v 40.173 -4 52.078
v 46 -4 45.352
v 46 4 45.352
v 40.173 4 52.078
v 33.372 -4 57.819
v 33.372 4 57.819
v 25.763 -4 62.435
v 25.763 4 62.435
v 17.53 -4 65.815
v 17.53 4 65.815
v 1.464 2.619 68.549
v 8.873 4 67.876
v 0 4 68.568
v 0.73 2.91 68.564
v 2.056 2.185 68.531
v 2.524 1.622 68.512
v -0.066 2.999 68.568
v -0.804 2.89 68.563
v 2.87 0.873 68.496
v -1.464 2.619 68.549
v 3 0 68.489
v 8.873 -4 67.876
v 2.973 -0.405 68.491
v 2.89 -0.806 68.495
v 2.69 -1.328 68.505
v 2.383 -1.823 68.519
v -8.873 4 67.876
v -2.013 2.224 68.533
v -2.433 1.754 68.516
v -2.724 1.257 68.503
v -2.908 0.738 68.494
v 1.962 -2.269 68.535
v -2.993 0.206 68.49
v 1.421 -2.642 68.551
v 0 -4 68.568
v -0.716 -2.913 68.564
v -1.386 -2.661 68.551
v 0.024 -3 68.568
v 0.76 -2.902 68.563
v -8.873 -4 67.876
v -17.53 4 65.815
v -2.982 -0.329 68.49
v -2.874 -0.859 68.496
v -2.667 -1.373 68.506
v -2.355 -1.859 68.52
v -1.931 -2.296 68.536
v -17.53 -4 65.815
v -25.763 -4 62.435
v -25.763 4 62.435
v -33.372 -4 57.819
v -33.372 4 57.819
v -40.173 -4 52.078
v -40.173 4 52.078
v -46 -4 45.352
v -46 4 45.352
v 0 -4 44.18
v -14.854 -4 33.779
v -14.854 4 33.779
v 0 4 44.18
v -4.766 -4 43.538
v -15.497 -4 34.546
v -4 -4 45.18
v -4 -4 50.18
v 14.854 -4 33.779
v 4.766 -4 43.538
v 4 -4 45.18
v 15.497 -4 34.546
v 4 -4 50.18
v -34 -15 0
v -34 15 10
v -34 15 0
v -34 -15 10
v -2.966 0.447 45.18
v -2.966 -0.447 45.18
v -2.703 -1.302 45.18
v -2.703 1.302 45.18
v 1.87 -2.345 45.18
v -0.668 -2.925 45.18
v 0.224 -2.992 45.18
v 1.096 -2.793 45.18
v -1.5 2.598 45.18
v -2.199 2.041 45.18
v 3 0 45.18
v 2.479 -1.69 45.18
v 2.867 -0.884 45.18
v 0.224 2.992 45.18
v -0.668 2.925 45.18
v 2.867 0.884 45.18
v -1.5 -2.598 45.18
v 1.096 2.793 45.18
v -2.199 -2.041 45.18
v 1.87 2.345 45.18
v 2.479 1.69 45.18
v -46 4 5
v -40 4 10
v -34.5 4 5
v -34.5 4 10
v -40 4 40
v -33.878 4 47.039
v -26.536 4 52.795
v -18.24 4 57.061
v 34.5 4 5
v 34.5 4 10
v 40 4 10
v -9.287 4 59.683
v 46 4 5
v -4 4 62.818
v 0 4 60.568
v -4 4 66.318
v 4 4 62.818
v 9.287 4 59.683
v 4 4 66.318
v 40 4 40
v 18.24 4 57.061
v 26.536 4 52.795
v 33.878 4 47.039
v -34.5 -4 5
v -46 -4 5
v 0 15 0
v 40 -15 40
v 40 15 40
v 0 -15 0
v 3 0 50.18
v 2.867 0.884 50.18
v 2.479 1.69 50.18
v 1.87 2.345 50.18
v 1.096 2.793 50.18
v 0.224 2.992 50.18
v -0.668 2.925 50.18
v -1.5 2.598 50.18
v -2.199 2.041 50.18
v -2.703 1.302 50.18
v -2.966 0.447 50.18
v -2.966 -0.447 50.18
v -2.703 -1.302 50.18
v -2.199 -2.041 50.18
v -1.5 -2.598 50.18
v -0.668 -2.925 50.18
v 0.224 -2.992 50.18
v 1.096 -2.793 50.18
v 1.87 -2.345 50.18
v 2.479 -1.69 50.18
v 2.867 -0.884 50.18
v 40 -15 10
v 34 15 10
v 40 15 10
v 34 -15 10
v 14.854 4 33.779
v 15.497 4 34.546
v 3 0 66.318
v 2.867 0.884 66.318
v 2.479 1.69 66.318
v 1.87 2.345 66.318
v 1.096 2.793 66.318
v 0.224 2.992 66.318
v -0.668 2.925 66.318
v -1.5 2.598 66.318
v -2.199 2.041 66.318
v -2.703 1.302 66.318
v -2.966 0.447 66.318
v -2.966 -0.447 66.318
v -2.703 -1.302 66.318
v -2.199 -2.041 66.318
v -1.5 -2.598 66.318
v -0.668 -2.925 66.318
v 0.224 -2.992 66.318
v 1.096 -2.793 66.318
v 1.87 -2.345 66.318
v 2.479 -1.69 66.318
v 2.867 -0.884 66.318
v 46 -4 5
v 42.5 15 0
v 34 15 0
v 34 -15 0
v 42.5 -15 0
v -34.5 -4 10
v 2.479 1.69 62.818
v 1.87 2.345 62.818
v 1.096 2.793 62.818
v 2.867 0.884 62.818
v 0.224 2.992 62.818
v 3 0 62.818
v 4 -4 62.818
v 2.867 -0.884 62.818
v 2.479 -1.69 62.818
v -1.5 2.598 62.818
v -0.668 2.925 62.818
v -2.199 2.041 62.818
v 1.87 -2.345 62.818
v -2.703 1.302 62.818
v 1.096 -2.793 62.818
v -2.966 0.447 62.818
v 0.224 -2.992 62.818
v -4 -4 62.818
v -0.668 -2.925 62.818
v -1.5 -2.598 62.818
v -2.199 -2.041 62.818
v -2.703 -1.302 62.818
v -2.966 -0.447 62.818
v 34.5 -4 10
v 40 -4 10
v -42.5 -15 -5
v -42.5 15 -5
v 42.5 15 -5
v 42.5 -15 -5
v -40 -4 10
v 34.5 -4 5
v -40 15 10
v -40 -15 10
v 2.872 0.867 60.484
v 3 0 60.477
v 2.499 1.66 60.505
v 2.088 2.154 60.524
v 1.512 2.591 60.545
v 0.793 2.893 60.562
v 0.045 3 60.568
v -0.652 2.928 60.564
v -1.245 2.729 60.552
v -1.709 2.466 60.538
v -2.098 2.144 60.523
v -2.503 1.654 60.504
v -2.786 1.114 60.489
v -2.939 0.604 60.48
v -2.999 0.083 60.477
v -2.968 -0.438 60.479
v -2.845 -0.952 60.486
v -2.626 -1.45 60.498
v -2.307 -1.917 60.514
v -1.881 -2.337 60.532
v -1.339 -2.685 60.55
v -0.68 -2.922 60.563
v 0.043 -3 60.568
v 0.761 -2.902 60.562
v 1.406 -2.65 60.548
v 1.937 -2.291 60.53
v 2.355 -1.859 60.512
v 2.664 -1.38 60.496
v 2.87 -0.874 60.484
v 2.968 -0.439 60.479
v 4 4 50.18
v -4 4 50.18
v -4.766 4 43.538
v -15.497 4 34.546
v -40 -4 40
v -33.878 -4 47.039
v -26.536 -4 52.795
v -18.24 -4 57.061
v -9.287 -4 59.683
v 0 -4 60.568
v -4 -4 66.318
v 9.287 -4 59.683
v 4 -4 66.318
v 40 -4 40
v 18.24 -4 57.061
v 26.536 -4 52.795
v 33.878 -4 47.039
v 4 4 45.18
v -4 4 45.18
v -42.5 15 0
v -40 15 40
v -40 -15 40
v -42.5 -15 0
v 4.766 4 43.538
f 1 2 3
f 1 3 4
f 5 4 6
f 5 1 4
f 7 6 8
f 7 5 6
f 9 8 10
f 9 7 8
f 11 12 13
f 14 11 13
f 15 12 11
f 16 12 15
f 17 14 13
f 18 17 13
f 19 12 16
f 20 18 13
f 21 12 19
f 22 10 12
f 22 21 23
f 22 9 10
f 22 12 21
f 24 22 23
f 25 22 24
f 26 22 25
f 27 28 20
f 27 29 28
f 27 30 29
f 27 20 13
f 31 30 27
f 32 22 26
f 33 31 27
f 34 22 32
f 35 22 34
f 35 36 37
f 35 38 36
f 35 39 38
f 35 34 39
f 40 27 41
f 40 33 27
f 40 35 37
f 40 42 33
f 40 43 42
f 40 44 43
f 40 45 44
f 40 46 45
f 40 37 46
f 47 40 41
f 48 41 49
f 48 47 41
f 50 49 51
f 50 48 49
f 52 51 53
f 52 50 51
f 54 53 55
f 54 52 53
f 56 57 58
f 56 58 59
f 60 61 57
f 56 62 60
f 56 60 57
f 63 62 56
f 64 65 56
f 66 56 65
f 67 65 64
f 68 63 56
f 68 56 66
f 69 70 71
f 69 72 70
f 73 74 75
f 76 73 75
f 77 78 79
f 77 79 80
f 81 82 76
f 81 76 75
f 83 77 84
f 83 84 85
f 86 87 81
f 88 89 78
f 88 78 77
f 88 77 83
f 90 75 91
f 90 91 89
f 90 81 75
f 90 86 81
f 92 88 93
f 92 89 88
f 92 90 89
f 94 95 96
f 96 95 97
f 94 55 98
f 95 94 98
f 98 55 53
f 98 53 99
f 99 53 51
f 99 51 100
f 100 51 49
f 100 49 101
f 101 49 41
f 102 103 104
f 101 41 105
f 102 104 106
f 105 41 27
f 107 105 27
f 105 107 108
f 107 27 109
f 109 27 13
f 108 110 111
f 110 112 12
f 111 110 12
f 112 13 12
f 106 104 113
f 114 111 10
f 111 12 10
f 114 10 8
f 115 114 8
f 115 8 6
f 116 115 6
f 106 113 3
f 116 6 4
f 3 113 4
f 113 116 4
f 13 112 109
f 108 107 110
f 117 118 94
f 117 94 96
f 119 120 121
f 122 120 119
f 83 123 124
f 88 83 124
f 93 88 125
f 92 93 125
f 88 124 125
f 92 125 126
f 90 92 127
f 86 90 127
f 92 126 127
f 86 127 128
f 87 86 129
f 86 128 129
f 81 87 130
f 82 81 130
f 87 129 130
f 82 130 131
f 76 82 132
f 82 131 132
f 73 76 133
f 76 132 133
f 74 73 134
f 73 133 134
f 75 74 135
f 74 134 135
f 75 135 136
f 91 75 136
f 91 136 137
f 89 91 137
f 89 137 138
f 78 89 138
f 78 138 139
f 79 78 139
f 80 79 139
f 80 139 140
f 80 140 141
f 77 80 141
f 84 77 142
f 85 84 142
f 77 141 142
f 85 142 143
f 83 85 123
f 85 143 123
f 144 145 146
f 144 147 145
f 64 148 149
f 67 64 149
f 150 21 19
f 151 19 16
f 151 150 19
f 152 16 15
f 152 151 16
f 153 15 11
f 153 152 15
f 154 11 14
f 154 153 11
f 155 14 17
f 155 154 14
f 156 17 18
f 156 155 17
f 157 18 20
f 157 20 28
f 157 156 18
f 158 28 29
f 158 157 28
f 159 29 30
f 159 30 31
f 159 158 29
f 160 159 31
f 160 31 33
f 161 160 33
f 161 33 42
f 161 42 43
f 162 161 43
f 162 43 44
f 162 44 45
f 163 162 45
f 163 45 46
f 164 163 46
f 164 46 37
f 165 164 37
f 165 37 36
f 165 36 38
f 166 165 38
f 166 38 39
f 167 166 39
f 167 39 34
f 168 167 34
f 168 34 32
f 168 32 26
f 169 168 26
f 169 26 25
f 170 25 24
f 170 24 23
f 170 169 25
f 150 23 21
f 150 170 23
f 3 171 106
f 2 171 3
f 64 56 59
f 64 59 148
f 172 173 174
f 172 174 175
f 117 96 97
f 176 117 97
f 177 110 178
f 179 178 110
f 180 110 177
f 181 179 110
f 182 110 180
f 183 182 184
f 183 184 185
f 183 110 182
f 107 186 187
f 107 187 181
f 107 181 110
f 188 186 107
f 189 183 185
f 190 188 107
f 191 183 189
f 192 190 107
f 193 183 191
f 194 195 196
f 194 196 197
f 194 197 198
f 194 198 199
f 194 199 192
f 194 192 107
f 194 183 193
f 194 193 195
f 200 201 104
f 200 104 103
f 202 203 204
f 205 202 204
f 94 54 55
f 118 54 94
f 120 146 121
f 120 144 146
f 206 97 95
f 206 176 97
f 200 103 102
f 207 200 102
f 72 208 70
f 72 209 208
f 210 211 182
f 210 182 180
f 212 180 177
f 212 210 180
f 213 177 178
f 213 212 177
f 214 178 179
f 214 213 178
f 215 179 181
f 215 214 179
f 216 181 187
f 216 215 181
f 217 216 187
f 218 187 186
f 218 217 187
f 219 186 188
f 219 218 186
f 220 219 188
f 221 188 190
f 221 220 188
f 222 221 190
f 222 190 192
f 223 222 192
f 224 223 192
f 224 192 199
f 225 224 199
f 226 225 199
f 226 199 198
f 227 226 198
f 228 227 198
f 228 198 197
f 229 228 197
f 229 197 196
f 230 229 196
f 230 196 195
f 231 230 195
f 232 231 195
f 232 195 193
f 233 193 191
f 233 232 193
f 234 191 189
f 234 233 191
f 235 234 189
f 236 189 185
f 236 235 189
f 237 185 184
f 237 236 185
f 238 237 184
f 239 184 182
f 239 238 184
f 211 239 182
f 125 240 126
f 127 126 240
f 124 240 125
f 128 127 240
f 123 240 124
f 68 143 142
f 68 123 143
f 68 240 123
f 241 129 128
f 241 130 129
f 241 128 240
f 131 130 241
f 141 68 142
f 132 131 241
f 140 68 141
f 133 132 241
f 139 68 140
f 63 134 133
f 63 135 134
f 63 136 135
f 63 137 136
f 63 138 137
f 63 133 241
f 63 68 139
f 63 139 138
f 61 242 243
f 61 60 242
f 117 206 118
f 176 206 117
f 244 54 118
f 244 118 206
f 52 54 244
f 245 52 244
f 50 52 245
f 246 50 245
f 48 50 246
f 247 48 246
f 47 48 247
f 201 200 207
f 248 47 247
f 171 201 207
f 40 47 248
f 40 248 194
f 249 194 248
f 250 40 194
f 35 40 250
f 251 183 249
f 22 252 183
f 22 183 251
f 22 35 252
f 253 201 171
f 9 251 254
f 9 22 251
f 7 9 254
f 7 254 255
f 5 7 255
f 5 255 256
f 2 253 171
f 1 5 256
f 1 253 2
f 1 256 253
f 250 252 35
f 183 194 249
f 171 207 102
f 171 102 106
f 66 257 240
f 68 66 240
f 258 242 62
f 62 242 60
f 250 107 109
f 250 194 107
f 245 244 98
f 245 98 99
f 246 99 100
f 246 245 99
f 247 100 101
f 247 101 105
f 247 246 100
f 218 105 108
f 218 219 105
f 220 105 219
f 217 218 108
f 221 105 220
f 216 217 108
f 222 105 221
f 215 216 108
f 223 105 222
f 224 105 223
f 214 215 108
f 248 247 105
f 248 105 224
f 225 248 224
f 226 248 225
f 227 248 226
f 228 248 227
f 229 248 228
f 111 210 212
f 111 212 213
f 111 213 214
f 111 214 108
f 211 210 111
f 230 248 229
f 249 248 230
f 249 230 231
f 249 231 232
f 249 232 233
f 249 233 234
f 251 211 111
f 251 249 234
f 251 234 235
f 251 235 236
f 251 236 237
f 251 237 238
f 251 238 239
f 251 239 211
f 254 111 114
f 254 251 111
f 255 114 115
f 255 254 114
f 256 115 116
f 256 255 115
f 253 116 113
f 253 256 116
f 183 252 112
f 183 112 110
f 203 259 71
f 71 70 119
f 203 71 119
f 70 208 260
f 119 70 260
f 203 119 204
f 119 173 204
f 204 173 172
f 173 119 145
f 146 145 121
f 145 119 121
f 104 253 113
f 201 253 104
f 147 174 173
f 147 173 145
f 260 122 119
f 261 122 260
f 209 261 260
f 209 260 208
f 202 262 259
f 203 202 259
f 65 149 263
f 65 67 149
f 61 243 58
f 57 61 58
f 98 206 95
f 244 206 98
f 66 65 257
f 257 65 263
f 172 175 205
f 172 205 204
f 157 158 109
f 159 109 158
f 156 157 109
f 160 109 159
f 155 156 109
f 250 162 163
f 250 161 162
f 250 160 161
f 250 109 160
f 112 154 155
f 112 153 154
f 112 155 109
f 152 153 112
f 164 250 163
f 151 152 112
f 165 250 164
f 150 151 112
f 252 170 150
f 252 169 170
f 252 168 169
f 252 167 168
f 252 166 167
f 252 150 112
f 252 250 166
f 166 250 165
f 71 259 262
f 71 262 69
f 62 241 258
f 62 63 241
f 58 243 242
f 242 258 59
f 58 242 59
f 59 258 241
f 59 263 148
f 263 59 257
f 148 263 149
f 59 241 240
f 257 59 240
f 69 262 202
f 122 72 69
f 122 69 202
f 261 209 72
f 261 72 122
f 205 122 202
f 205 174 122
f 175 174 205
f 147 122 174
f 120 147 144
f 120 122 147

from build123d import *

# Parameters (mm, degrees)
F0_W      = 85
F0_H      = 30
F1_DEPTH  = 5
F3_DEPTH  = 15
F5_DEPTH  = 4
F6_R      = 3
F7_DEPTH  = 80
F9_DEPTH  = 4
F10_R     = 3
F11_DEPTH = 5
F12_SIZE  = 1


with BuildPart() as f1:
    # F0 (on Top) → F1 (new body)
    with BuildSketch(Plane.XY):
        Rectangle(F0_W, F0_H)
    extrude(amount=-F1_DEPTH)

    # F2 (on Front) → F3 (join, symmetric)
    with BuildSketch(Plane.XZ):
        Polygon((-34, 0), (0, 0), (-40, 40), (-40, 10), (-34, 10), align=None)
        Polygon((40, 40), (0, 0), (34, 0), (34, 10), (40, 10), align=None)
    extrude(amount=F3_DEPTH, both=True)


with BuildPart() as f5:
    # F4 (on Front) → F5 (new body, symmetric)
    with BuildSketch(Plane.XZ):
        with BuildLine():
            Line((-40, 10), (-40, 40))
            ThreePointArc((-40, 40), (-22.4891657332, 55.1249006818), (0, 60.5681866361))
            ThreePointArc((0, 60.5681866361), (22.4891657332, 55.1249006818), (40, 40))
            Line((40, 40), (40, 10))
            Line((40, 10), (34.5, 10))
            Line((34.5, 10), (34.5, 5))
            Line((34.5, 5), (46, 5))
            Line((46, 5), (46, 45.3515663186))
            ThreePointArc((46, 45.3515663186), (25.7634016531, 62.4351125068), (0, 68.5681866361))
            ThreePointArc((0, 68.5681866361), (-25.7634016531, 62.4351125068), (-46, 45.3515663186))
            Line((-46, 45.3515663186), (-46, 5))
            Line((-46, 5), (-34.5, 5))
            Line((-34.5, 5), (-34.5, 10))
            Line((-34.5, 10), (-40, 10))
        make_face()
        Polygon((-4, 66.3181866361), (0, 66.3181866361), (4, 66.3181866361), (4, 62.8181866361), (0, 62.8181866361), (-4, 62.8181866361), align=None, mode=Mode.SUBTRACT)
    extrude(amount=F5_DEPTH, both=True)

    # F6 (on Top) → F7 (cut)
    with BuildSketch(Plane.XY):
        Circle(F6_R)
    extrude(amount=F7_DEPTH, mode=Mode.SUBTRACT)


with BuildPart() as f9:
    # F8 (on Front) → F9 (new body, symmetric)
    with BuildSketch(Plane.XZ):
        Polygon((4, 50.1803820431), (0, 50.1803820431), (-4, 50.1803820431), (-4, 44.1803820431), (-15.4966514918, 34.5457048573), (-14.8543396794, 33.7792614245), (0, 44.1803820431), (14.8543396794, 33.7792614245), (15.4966514918, 34.5457048573), (4, 44.1803820431), align=None)
    extrude(amount=F9_DEPTH, both=True)

    # F10 (on face) → F11 (cut)
    with BuildSketch(Plane.XY.offset(50.1803820431)):
        Circle(F10_R)
    extrude(amount=-F11_DEPTH, mode=Mode.SUBTRACT)

    # F12
    f12_edges = [f9.edges().sort_by_distance(p)[0] for p in [
        (-4, 0, 44.180382),
        (4, 0, 44.180382),
    ]]
    chamfer(f12_edges, length=F12_SIZE)


solid = Compound([f1.part, f5.part, f9.part])
